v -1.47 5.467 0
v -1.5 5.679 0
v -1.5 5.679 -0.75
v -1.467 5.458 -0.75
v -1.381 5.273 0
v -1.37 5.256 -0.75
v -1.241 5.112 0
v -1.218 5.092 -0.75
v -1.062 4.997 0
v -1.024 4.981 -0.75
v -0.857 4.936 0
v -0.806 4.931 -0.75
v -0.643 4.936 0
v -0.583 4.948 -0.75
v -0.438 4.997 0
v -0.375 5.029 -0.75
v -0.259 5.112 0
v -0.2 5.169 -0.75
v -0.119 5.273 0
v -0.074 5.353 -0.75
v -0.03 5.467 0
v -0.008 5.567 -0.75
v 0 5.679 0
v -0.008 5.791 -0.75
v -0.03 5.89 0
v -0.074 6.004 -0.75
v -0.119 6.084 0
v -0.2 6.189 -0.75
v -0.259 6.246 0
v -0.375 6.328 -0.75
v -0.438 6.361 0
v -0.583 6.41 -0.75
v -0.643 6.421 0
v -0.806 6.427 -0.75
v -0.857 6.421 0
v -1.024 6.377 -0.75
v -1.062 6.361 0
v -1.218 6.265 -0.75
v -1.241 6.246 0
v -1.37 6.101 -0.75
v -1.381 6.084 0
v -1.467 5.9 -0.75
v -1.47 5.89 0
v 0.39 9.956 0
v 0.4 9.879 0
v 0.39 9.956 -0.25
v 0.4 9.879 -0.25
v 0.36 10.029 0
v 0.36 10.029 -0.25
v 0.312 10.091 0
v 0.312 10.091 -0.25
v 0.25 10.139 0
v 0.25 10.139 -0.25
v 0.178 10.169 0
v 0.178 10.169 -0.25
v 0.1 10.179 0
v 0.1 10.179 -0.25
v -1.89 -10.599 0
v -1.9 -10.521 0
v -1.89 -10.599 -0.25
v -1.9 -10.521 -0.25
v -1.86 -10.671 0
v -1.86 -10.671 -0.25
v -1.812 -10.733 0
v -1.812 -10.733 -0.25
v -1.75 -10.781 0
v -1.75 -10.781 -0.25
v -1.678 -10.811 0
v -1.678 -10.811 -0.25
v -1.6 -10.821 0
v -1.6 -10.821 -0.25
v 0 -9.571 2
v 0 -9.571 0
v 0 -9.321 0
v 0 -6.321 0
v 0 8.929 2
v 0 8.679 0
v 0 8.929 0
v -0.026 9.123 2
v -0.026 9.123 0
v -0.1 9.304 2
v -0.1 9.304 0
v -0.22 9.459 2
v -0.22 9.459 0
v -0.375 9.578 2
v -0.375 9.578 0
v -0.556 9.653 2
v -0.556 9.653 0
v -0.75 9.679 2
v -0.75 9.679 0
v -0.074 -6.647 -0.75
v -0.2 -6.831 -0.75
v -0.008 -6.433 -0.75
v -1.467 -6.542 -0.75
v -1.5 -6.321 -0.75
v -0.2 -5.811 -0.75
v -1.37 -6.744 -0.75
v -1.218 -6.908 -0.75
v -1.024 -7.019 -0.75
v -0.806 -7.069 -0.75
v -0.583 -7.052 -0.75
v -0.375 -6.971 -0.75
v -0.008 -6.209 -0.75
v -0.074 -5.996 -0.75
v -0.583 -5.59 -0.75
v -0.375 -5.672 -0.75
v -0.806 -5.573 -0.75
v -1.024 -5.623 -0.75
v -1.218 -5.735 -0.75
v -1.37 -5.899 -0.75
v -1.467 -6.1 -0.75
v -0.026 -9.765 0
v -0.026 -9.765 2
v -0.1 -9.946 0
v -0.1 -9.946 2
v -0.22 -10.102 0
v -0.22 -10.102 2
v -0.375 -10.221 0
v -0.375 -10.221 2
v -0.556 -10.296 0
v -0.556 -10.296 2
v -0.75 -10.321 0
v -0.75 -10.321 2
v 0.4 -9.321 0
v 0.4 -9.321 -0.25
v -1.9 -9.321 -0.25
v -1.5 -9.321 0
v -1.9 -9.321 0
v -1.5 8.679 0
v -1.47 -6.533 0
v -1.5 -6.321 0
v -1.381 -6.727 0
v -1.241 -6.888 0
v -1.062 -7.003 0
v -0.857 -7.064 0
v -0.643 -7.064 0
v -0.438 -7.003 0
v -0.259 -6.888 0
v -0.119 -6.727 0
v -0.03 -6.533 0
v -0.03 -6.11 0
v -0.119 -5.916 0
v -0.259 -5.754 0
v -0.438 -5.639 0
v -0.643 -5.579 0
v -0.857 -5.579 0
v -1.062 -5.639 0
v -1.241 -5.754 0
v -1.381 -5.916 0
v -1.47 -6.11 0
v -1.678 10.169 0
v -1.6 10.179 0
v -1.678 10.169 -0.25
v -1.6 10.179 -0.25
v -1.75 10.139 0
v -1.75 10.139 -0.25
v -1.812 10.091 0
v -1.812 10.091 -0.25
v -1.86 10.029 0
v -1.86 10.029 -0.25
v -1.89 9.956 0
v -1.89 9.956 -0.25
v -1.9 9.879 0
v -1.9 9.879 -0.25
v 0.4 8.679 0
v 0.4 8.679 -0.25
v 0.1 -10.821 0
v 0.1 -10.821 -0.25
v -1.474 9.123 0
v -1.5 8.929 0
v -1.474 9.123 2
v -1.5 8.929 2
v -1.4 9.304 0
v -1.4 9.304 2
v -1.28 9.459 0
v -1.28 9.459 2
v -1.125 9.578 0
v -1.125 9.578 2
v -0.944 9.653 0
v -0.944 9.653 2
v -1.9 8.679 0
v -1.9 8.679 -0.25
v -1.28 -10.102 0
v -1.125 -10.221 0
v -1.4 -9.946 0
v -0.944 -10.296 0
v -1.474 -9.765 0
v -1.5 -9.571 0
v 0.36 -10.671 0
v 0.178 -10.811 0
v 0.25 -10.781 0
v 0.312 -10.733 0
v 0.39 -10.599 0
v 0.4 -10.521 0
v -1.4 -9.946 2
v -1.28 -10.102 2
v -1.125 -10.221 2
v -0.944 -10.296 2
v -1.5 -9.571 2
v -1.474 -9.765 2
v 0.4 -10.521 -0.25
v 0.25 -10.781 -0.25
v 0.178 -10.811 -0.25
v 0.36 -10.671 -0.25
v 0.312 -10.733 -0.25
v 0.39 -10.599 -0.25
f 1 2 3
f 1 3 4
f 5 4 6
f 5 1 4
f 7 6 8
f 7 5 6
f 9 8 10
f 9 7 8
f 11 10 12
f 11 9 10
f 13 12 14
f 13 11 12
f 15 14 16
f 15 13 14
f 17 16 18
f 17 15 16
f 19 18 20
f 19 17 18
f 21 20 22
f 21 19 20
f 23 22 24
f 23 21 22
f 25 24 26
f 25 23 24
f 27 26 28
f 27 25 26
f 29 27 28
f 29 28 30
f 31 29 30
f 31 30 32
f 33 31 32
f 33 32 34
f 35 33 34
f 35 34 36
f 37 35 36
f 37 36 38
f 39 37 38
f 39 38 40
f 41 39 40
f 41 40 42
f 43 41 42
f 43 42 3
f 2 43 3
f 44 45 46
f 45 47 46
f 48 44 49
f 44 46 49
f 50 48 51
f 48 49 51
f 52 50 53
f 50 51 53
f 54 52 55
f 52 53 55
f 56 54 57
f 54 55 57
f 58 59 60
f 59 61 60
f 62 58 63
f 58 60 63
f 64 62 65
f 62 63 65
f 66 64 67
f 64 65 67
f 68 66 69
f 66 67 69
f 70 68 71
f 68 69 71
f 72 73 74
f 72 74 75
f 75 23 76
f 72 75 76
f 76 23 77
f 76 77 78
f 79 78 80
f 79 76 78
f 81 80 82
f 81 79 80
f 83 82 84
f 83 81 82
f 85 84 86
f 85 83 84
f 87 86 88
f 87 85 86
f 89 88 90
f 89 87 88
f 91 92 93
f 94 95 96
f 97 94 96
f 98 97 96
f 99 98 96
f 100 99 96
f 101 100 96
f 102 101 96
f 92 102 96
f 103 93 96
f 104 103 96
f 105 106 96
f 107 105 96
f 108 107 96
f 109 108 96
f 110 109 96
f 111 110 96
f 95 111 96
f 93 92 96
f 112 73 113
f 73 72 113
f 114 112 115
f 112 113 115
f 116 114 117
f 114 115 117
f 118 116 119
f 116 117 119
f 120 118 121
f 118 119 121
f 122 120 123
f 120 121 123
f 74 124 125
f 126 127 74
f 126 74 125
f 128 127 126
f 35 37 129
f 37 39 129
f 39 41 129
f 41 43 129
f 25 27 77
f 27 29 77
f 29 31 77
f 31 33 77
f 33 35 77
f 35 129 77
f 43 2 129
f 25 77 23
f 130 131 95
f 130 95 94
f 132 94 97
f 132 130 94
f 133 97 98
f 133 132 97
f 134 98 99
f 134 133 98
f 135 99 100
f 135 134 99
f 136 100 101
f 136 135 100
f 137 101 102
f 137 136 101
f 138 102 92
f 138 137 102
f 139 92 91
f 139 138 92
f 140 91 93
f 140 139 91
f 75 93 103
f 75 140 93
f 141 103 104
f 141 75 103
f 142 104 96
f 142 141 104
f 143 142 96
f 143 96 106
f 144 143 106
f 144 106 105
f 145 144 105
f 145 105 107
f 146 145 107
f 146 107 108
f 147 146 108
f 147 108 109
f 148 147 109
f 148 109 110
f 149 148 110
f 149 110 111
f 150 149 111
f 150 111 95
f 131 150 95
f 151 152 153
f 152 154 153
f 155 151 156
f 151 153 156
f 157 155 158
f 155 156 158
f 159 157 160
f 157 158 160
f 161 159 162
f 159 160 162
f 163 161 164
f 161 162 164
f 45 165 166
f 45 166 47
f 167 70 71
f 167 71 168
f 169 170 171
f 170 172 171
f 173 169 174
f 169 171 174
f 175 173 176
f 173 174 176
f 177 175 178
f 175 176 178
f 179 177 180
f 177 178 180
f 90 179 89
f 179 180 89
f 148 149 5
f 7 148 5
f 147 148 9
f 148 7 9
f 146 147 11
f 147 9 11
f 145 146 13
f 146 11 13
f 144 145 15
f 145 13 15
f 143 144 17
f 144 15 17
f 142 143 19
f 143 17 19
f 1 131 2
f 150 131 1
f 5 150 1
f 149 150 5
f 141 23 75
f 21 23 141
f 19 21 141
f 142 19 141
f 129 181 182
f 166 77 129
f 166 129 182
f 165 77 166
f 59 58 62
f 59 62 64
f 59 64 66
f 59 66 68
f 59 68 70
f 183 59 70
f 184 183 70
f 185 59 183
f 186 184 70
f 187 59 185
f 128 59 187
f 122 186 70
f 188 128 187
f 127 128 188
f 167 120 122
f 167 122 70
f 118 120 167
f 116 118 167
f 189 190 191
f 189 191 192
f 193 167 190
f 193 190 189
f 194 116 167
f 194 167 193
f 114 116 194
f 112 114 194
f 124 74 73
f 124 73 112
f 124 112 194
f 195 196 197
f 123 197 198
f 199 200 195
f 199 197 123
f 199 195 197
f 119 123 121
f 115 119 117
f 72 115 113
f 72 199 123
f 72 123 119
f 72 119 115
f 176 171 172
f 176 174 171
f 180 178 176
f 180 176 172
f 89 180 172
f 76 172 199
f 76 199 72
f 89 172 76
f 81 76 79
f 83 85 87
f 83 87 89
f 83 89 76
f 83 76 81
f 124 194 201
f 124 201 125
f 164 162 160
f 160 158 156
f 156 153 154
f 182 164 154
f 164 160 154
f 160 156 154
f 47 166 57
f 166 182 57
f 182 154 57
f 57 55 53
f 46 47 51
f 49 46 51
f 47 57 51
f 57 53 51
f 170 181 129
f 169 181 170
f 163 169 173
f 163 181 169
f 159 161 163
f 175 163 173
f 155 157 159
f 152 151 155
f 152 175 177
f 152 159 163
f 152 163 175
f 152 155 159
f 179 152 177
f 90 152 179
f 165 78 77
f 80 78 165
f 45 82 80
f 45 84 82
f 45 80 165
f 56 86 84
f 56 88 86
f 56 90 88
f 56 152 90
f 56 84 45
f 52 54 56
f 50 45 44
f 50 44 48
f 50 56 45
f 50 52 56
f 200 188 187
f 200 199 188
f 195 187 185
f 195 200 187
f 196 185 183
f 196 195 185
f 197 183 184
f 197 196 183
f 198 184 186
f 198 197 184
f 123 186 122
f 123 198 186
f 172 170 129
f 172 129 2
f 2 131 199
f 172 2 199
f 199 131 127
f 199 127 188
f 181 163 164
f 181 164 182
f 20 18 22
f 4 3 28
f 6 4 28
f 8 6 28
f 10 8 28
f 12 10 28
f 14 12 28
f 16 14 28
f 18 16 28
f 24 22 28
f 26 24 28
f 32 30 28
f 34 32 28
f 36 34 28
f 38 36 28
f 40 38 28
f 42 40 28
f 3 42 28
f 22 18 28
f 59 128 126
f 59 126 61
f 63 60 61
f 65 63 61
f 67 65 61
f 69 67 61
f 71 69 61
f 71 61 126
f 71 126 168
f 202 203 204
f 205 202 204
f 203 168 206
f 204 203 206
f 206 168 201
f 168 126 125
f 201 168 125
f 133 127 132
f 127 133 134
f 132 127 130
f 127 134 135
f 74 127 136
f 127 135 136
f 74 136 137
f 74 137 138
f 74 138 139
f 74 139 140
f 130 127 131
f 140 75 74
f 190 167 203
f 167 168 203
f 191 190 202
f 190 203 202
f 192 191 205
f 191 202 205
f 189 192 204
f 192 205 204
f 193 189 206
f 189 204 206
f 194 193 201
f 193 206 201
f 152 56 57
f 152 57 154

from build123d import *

# Parameters (mm, degrees)
F0_W     = 1.5
F0_H     = 1
F1_DEPTH = 2
F2_DEPTH = 0.25
F3_DEPTH = 0.75
F4_R     = 0.74999
F5_R     = 0.3


# Not quite as in the source:
# - a fillet or chamfer is up to 0.001 mm smaller than in the source, because OpenCascade refuses the exact size


with BuildPart() as f1:
    # F0 (on Top) → F1 (new body)
    with BuildSketch(Plane.XY):
        with Locations((-0.75, 9.1787409857)):
            Rectangle(F0_W, F0_H)
        with BuildLine():
            Line((0, 8.6787409857), (-1.5, 8.6787409857))
            Line((-1.5, 8.6787409857), (-1.5, 5.6787409857))
            ThreePointArc((-1.5, 5.6787409857), (-0.75, 6.4287409857), (0, 5.6787409857))
            Line((0, 5.6787409857), (0, 8.6787409857))
        make_face()
        with BuildLine():
            ThreePointArc((0, 5.6787409857), (-0.75, 6.4287409857), (-1.5, 5.6787409857))
            ThreePointArc((-1.5, 5.6787409857), (-0.75, 4.9287409857), (0, 5.6787409857))
        make_face()
        with BuildLine():
            ThreePointArc((0, 5.6787409857), (-0.75, 4.9287409857), (-1.5, 5.6787409857))
            Line((-1.5, 5.6787409857), (-1.5, -6.3212590143))
            ThreePointArc((-1.5, -6.3212590143), (-0.75, -5.5712590143), (0, -6.3212590143))
            Line((0, -6.3212590143), (0, 5.6787409857))
        make_face()
        with BuildLine():
            ThreePointArc((0, -6.3212590143), (-0.75, -5.5712590143), (-1.5, -6.3212590143))
            ThreePointArc((-1.5, -6.3212590143), (-0.75, -7.0712590143), (0, -6.3212590143))
        make_face()
        with BuildLine():
            ThreePointArc((0, -6.3212590143), (-0.75, -7.0712590143), (-1.5, -6.3212590143))
            Line((-1.5, -6.3212590143), (-1.5, -9.3212590143))
            Line((-1.5, -9.3212590143), (0, -9.3212590143))
            Line((0, -9.3212590143), (0, -6.3212590143))
        make_face()
        with Locations((-0.75, -9.8212590143)):
            Rectangle(F0_W, F0_H)
    extrude(amount=F1_DEPTH)

    # F0 (on Top) → F2 (join)
    with BuildSketch(Plane.XY):
        with Locations((-0.75, -9.8212590143)):
            Rectangle(F0_W, F0_H)
        Polygon((-1.5, -10.3212590143), (-1.5, -9.3212590143), (-1.9, -9.3212590143), (-1.9, -10.8212590143), (0.4, -10.8212590143), (0.4, -9.3212590143), (0, -9.3212590143), (0, -10.3212590143), align=None)
        Polygon((-1.5, 8.6787409857), (-1.5, 9.6787409857), (0, 9.6787409857), (0, 8.6787409857), (0.4, 8.6787409857), (0.4, 10.1787409857), (-1.9, 10.1787409857), (-1.9, 8.6787409857), align=None)
        with Locations((-0.75, 9.1787409857)):
            Rectangle(F0_W, F0_H)
    extrude(amount=-F2_DEPTH)

    # F0 (on Top) → F3 (join)
    with BuildSketch(Plane.XY):
        with BuildLine():
            ThreePointArc((0, -6.3212590143), (-0.75, -5.5712590143), (-1.5, -6.3212590143))
            ThreePointArc((-1.5, -6.3212590143), (-0.75, -7.0712590143), (0, -6.3212590143))
        make_face()
        with BuildLine():
            ThreePointArc((0, 5.6787409857), (-0.75, 6.4287409857), (-1.5, 5.6787409857))
            ThreePointArc((-1.5, 5.6787409857), (-0.75, 4.9287409857), (0, 5.6787409857))
        make_face()
    extrude(amount=-F3_DEPTH)

    # F4 (radius 0.75 in the source; OpenCascade refuses exactly that, so slightly less here)
    f4_edges = [f1.edges().sort_by_distance(p)[0] for p in [
        (0, 9.678741, 1),
        (-1.5, 9.678741, 1),
        (0, -10.321259, 1),
        (-1.5, -10.321259, 1),
    ]]
    fillet(f4_edges, radius=F4_R)

    # F5
    f5_edges = [f1.edges().sort_by_distance(p)[0] for p in [
        (0.4, 10.178741, -0.125),
        (-1.9, 10.178741, -0.125),
        (0.4, -10.821259, -0.125),
        (-1.9, -10.821259, -0.125),
    ]]
    fillet(f5_edges, radius=F5_R)


solid = f1.part
